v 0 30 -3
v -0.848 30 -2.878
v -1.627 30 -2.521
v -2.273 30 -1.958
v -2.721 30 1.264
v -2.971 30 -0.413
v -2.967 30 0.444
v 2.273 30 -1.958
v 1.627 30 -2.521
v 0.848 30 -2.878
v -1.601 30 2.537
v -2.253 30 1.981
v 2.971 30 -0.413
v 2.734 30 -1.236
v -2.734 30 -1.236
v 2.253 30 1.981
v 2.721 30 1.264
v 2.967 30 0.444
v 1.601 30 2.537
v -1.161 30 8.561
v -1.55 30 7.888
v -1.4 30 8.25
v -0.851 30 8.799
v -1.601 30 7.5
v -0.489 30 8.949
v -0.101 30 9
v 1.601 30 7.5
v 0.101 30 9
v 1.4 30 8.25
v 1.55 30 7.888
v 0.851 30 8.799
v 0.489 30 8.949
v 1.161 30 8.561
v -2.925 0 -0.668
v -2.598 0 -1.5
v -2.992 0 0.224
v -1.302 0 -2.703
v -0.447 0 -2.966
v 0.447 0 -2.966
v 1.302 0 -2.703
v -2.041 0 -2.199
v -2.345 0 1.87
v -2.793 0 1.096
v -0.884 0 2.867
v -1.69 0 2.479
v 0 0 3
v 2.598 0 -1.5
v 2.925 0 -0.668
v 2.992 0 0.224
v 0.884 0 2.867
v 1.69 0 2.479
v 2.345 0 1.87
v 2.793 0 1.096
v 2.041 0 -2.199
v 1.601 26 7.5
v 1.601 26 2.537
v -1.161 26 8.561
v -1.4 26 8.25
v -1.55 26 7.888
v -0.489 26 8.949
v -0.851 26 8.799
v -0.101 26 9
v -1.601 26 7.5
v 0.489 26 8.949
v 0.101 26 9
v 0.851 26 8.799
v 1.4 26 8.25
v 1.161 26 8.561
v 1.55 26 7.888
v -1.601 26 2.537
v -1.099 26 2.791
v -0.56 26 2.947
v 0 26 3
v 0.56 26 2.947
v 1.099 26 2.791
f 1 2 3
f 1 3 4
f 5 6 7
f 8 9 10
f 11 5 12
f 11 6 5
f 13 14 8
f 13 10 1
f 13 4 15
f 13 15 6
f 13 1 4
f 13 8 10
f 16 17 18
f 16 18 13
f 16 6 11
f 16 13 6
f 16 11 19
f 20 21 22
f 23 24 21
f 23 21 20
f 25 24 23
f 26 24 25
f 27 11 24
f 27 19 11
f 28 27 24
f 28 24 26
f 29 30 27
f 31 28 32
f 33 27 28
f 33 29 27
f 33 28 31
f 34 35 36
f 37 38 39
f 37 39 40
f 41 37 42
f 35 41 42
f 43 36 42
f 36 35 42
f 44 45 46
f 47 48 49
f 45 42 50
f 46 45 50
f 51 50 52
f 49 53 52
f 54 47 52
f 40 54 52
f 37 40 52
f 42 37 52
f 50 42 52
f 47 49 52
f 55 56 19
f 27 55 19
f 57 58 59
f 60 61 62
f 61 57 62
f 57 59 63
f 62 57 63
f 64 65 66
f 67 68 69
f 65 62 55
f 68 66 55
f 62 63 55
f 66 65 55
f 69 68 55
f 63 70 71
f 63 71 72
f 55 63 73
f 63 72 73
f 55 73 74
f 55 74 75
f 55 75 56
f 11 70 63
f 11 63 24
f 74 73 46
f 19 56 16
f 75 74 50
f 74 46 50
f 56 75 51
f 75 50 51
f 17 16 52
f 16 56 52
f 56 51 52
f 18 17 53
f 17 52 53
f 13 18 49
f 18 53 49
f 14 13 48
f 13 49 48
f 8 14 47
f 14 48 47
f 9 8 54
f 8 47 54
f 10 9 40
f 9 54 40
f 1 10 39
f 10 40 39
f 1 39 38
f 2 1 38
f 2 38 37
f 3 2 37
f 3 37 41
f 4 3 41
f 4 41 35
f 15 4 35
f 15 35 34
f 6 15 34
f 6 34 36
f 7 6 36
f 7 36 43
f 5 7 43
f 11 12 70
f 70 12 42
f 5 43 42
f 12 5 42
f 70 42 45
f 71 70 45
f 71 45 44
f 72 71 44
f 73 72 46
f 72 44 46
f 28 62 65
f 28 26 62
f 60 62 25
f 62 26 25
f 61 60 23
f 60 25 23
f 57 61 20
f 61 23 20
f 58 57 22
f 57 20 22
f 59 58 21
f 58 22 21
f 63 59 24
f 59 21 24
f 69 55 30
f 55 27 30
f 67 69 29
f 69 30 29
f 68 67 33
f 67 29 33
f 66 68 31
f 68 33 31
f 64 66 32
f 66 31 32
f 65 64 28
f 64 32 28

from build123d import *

# Parameters (mm, degrees)
CROQUIS1_R              = 3
SALIENTE_EXTRUIR1_DEPTH = 30
CROQUIS2_W              = 3.201408756
CROQUIS2_H              = 4
SALIENTE_EXTRUIR2_DEPTH = 9
REDONDEO2_R             = 1.5


with BuildPart() as part:
    # Croquis1 → Saliente-Extruir1 (new body)
    with BuildSketch(Plane(origin=(0, 0, 0), x_dir=(1, 0, 0), z_dir=(0, 1, 0))):
        with Locations(Location((0, 0, 0), (0, 0, 270))):
            Circle(CROQUIS1_R)
    extrude(amount=SALIENTE_EXTRUIR1_DEPTH)

    # Croquis2 → Saliente-Extruir2 (add)
    with BuildSketch(Plane.XY):
        with Locations((0, 28)):
            Rectangle(CROQUIS2_W, CROQUIS2_H)
    extrude(amount=SALIENTE_EXTRUIR2_DEPTH)

    # Redondeo2
    redondeo2_edges = [part.edges().sort_by_distance(p)[0] for p in [
        (1.600704378, 28, 9),
        (-1.600704378, 28, 9),
    ]]
    fillet(redondeo2_edges, radius=REDONDEO2_R)


solid = part.part
